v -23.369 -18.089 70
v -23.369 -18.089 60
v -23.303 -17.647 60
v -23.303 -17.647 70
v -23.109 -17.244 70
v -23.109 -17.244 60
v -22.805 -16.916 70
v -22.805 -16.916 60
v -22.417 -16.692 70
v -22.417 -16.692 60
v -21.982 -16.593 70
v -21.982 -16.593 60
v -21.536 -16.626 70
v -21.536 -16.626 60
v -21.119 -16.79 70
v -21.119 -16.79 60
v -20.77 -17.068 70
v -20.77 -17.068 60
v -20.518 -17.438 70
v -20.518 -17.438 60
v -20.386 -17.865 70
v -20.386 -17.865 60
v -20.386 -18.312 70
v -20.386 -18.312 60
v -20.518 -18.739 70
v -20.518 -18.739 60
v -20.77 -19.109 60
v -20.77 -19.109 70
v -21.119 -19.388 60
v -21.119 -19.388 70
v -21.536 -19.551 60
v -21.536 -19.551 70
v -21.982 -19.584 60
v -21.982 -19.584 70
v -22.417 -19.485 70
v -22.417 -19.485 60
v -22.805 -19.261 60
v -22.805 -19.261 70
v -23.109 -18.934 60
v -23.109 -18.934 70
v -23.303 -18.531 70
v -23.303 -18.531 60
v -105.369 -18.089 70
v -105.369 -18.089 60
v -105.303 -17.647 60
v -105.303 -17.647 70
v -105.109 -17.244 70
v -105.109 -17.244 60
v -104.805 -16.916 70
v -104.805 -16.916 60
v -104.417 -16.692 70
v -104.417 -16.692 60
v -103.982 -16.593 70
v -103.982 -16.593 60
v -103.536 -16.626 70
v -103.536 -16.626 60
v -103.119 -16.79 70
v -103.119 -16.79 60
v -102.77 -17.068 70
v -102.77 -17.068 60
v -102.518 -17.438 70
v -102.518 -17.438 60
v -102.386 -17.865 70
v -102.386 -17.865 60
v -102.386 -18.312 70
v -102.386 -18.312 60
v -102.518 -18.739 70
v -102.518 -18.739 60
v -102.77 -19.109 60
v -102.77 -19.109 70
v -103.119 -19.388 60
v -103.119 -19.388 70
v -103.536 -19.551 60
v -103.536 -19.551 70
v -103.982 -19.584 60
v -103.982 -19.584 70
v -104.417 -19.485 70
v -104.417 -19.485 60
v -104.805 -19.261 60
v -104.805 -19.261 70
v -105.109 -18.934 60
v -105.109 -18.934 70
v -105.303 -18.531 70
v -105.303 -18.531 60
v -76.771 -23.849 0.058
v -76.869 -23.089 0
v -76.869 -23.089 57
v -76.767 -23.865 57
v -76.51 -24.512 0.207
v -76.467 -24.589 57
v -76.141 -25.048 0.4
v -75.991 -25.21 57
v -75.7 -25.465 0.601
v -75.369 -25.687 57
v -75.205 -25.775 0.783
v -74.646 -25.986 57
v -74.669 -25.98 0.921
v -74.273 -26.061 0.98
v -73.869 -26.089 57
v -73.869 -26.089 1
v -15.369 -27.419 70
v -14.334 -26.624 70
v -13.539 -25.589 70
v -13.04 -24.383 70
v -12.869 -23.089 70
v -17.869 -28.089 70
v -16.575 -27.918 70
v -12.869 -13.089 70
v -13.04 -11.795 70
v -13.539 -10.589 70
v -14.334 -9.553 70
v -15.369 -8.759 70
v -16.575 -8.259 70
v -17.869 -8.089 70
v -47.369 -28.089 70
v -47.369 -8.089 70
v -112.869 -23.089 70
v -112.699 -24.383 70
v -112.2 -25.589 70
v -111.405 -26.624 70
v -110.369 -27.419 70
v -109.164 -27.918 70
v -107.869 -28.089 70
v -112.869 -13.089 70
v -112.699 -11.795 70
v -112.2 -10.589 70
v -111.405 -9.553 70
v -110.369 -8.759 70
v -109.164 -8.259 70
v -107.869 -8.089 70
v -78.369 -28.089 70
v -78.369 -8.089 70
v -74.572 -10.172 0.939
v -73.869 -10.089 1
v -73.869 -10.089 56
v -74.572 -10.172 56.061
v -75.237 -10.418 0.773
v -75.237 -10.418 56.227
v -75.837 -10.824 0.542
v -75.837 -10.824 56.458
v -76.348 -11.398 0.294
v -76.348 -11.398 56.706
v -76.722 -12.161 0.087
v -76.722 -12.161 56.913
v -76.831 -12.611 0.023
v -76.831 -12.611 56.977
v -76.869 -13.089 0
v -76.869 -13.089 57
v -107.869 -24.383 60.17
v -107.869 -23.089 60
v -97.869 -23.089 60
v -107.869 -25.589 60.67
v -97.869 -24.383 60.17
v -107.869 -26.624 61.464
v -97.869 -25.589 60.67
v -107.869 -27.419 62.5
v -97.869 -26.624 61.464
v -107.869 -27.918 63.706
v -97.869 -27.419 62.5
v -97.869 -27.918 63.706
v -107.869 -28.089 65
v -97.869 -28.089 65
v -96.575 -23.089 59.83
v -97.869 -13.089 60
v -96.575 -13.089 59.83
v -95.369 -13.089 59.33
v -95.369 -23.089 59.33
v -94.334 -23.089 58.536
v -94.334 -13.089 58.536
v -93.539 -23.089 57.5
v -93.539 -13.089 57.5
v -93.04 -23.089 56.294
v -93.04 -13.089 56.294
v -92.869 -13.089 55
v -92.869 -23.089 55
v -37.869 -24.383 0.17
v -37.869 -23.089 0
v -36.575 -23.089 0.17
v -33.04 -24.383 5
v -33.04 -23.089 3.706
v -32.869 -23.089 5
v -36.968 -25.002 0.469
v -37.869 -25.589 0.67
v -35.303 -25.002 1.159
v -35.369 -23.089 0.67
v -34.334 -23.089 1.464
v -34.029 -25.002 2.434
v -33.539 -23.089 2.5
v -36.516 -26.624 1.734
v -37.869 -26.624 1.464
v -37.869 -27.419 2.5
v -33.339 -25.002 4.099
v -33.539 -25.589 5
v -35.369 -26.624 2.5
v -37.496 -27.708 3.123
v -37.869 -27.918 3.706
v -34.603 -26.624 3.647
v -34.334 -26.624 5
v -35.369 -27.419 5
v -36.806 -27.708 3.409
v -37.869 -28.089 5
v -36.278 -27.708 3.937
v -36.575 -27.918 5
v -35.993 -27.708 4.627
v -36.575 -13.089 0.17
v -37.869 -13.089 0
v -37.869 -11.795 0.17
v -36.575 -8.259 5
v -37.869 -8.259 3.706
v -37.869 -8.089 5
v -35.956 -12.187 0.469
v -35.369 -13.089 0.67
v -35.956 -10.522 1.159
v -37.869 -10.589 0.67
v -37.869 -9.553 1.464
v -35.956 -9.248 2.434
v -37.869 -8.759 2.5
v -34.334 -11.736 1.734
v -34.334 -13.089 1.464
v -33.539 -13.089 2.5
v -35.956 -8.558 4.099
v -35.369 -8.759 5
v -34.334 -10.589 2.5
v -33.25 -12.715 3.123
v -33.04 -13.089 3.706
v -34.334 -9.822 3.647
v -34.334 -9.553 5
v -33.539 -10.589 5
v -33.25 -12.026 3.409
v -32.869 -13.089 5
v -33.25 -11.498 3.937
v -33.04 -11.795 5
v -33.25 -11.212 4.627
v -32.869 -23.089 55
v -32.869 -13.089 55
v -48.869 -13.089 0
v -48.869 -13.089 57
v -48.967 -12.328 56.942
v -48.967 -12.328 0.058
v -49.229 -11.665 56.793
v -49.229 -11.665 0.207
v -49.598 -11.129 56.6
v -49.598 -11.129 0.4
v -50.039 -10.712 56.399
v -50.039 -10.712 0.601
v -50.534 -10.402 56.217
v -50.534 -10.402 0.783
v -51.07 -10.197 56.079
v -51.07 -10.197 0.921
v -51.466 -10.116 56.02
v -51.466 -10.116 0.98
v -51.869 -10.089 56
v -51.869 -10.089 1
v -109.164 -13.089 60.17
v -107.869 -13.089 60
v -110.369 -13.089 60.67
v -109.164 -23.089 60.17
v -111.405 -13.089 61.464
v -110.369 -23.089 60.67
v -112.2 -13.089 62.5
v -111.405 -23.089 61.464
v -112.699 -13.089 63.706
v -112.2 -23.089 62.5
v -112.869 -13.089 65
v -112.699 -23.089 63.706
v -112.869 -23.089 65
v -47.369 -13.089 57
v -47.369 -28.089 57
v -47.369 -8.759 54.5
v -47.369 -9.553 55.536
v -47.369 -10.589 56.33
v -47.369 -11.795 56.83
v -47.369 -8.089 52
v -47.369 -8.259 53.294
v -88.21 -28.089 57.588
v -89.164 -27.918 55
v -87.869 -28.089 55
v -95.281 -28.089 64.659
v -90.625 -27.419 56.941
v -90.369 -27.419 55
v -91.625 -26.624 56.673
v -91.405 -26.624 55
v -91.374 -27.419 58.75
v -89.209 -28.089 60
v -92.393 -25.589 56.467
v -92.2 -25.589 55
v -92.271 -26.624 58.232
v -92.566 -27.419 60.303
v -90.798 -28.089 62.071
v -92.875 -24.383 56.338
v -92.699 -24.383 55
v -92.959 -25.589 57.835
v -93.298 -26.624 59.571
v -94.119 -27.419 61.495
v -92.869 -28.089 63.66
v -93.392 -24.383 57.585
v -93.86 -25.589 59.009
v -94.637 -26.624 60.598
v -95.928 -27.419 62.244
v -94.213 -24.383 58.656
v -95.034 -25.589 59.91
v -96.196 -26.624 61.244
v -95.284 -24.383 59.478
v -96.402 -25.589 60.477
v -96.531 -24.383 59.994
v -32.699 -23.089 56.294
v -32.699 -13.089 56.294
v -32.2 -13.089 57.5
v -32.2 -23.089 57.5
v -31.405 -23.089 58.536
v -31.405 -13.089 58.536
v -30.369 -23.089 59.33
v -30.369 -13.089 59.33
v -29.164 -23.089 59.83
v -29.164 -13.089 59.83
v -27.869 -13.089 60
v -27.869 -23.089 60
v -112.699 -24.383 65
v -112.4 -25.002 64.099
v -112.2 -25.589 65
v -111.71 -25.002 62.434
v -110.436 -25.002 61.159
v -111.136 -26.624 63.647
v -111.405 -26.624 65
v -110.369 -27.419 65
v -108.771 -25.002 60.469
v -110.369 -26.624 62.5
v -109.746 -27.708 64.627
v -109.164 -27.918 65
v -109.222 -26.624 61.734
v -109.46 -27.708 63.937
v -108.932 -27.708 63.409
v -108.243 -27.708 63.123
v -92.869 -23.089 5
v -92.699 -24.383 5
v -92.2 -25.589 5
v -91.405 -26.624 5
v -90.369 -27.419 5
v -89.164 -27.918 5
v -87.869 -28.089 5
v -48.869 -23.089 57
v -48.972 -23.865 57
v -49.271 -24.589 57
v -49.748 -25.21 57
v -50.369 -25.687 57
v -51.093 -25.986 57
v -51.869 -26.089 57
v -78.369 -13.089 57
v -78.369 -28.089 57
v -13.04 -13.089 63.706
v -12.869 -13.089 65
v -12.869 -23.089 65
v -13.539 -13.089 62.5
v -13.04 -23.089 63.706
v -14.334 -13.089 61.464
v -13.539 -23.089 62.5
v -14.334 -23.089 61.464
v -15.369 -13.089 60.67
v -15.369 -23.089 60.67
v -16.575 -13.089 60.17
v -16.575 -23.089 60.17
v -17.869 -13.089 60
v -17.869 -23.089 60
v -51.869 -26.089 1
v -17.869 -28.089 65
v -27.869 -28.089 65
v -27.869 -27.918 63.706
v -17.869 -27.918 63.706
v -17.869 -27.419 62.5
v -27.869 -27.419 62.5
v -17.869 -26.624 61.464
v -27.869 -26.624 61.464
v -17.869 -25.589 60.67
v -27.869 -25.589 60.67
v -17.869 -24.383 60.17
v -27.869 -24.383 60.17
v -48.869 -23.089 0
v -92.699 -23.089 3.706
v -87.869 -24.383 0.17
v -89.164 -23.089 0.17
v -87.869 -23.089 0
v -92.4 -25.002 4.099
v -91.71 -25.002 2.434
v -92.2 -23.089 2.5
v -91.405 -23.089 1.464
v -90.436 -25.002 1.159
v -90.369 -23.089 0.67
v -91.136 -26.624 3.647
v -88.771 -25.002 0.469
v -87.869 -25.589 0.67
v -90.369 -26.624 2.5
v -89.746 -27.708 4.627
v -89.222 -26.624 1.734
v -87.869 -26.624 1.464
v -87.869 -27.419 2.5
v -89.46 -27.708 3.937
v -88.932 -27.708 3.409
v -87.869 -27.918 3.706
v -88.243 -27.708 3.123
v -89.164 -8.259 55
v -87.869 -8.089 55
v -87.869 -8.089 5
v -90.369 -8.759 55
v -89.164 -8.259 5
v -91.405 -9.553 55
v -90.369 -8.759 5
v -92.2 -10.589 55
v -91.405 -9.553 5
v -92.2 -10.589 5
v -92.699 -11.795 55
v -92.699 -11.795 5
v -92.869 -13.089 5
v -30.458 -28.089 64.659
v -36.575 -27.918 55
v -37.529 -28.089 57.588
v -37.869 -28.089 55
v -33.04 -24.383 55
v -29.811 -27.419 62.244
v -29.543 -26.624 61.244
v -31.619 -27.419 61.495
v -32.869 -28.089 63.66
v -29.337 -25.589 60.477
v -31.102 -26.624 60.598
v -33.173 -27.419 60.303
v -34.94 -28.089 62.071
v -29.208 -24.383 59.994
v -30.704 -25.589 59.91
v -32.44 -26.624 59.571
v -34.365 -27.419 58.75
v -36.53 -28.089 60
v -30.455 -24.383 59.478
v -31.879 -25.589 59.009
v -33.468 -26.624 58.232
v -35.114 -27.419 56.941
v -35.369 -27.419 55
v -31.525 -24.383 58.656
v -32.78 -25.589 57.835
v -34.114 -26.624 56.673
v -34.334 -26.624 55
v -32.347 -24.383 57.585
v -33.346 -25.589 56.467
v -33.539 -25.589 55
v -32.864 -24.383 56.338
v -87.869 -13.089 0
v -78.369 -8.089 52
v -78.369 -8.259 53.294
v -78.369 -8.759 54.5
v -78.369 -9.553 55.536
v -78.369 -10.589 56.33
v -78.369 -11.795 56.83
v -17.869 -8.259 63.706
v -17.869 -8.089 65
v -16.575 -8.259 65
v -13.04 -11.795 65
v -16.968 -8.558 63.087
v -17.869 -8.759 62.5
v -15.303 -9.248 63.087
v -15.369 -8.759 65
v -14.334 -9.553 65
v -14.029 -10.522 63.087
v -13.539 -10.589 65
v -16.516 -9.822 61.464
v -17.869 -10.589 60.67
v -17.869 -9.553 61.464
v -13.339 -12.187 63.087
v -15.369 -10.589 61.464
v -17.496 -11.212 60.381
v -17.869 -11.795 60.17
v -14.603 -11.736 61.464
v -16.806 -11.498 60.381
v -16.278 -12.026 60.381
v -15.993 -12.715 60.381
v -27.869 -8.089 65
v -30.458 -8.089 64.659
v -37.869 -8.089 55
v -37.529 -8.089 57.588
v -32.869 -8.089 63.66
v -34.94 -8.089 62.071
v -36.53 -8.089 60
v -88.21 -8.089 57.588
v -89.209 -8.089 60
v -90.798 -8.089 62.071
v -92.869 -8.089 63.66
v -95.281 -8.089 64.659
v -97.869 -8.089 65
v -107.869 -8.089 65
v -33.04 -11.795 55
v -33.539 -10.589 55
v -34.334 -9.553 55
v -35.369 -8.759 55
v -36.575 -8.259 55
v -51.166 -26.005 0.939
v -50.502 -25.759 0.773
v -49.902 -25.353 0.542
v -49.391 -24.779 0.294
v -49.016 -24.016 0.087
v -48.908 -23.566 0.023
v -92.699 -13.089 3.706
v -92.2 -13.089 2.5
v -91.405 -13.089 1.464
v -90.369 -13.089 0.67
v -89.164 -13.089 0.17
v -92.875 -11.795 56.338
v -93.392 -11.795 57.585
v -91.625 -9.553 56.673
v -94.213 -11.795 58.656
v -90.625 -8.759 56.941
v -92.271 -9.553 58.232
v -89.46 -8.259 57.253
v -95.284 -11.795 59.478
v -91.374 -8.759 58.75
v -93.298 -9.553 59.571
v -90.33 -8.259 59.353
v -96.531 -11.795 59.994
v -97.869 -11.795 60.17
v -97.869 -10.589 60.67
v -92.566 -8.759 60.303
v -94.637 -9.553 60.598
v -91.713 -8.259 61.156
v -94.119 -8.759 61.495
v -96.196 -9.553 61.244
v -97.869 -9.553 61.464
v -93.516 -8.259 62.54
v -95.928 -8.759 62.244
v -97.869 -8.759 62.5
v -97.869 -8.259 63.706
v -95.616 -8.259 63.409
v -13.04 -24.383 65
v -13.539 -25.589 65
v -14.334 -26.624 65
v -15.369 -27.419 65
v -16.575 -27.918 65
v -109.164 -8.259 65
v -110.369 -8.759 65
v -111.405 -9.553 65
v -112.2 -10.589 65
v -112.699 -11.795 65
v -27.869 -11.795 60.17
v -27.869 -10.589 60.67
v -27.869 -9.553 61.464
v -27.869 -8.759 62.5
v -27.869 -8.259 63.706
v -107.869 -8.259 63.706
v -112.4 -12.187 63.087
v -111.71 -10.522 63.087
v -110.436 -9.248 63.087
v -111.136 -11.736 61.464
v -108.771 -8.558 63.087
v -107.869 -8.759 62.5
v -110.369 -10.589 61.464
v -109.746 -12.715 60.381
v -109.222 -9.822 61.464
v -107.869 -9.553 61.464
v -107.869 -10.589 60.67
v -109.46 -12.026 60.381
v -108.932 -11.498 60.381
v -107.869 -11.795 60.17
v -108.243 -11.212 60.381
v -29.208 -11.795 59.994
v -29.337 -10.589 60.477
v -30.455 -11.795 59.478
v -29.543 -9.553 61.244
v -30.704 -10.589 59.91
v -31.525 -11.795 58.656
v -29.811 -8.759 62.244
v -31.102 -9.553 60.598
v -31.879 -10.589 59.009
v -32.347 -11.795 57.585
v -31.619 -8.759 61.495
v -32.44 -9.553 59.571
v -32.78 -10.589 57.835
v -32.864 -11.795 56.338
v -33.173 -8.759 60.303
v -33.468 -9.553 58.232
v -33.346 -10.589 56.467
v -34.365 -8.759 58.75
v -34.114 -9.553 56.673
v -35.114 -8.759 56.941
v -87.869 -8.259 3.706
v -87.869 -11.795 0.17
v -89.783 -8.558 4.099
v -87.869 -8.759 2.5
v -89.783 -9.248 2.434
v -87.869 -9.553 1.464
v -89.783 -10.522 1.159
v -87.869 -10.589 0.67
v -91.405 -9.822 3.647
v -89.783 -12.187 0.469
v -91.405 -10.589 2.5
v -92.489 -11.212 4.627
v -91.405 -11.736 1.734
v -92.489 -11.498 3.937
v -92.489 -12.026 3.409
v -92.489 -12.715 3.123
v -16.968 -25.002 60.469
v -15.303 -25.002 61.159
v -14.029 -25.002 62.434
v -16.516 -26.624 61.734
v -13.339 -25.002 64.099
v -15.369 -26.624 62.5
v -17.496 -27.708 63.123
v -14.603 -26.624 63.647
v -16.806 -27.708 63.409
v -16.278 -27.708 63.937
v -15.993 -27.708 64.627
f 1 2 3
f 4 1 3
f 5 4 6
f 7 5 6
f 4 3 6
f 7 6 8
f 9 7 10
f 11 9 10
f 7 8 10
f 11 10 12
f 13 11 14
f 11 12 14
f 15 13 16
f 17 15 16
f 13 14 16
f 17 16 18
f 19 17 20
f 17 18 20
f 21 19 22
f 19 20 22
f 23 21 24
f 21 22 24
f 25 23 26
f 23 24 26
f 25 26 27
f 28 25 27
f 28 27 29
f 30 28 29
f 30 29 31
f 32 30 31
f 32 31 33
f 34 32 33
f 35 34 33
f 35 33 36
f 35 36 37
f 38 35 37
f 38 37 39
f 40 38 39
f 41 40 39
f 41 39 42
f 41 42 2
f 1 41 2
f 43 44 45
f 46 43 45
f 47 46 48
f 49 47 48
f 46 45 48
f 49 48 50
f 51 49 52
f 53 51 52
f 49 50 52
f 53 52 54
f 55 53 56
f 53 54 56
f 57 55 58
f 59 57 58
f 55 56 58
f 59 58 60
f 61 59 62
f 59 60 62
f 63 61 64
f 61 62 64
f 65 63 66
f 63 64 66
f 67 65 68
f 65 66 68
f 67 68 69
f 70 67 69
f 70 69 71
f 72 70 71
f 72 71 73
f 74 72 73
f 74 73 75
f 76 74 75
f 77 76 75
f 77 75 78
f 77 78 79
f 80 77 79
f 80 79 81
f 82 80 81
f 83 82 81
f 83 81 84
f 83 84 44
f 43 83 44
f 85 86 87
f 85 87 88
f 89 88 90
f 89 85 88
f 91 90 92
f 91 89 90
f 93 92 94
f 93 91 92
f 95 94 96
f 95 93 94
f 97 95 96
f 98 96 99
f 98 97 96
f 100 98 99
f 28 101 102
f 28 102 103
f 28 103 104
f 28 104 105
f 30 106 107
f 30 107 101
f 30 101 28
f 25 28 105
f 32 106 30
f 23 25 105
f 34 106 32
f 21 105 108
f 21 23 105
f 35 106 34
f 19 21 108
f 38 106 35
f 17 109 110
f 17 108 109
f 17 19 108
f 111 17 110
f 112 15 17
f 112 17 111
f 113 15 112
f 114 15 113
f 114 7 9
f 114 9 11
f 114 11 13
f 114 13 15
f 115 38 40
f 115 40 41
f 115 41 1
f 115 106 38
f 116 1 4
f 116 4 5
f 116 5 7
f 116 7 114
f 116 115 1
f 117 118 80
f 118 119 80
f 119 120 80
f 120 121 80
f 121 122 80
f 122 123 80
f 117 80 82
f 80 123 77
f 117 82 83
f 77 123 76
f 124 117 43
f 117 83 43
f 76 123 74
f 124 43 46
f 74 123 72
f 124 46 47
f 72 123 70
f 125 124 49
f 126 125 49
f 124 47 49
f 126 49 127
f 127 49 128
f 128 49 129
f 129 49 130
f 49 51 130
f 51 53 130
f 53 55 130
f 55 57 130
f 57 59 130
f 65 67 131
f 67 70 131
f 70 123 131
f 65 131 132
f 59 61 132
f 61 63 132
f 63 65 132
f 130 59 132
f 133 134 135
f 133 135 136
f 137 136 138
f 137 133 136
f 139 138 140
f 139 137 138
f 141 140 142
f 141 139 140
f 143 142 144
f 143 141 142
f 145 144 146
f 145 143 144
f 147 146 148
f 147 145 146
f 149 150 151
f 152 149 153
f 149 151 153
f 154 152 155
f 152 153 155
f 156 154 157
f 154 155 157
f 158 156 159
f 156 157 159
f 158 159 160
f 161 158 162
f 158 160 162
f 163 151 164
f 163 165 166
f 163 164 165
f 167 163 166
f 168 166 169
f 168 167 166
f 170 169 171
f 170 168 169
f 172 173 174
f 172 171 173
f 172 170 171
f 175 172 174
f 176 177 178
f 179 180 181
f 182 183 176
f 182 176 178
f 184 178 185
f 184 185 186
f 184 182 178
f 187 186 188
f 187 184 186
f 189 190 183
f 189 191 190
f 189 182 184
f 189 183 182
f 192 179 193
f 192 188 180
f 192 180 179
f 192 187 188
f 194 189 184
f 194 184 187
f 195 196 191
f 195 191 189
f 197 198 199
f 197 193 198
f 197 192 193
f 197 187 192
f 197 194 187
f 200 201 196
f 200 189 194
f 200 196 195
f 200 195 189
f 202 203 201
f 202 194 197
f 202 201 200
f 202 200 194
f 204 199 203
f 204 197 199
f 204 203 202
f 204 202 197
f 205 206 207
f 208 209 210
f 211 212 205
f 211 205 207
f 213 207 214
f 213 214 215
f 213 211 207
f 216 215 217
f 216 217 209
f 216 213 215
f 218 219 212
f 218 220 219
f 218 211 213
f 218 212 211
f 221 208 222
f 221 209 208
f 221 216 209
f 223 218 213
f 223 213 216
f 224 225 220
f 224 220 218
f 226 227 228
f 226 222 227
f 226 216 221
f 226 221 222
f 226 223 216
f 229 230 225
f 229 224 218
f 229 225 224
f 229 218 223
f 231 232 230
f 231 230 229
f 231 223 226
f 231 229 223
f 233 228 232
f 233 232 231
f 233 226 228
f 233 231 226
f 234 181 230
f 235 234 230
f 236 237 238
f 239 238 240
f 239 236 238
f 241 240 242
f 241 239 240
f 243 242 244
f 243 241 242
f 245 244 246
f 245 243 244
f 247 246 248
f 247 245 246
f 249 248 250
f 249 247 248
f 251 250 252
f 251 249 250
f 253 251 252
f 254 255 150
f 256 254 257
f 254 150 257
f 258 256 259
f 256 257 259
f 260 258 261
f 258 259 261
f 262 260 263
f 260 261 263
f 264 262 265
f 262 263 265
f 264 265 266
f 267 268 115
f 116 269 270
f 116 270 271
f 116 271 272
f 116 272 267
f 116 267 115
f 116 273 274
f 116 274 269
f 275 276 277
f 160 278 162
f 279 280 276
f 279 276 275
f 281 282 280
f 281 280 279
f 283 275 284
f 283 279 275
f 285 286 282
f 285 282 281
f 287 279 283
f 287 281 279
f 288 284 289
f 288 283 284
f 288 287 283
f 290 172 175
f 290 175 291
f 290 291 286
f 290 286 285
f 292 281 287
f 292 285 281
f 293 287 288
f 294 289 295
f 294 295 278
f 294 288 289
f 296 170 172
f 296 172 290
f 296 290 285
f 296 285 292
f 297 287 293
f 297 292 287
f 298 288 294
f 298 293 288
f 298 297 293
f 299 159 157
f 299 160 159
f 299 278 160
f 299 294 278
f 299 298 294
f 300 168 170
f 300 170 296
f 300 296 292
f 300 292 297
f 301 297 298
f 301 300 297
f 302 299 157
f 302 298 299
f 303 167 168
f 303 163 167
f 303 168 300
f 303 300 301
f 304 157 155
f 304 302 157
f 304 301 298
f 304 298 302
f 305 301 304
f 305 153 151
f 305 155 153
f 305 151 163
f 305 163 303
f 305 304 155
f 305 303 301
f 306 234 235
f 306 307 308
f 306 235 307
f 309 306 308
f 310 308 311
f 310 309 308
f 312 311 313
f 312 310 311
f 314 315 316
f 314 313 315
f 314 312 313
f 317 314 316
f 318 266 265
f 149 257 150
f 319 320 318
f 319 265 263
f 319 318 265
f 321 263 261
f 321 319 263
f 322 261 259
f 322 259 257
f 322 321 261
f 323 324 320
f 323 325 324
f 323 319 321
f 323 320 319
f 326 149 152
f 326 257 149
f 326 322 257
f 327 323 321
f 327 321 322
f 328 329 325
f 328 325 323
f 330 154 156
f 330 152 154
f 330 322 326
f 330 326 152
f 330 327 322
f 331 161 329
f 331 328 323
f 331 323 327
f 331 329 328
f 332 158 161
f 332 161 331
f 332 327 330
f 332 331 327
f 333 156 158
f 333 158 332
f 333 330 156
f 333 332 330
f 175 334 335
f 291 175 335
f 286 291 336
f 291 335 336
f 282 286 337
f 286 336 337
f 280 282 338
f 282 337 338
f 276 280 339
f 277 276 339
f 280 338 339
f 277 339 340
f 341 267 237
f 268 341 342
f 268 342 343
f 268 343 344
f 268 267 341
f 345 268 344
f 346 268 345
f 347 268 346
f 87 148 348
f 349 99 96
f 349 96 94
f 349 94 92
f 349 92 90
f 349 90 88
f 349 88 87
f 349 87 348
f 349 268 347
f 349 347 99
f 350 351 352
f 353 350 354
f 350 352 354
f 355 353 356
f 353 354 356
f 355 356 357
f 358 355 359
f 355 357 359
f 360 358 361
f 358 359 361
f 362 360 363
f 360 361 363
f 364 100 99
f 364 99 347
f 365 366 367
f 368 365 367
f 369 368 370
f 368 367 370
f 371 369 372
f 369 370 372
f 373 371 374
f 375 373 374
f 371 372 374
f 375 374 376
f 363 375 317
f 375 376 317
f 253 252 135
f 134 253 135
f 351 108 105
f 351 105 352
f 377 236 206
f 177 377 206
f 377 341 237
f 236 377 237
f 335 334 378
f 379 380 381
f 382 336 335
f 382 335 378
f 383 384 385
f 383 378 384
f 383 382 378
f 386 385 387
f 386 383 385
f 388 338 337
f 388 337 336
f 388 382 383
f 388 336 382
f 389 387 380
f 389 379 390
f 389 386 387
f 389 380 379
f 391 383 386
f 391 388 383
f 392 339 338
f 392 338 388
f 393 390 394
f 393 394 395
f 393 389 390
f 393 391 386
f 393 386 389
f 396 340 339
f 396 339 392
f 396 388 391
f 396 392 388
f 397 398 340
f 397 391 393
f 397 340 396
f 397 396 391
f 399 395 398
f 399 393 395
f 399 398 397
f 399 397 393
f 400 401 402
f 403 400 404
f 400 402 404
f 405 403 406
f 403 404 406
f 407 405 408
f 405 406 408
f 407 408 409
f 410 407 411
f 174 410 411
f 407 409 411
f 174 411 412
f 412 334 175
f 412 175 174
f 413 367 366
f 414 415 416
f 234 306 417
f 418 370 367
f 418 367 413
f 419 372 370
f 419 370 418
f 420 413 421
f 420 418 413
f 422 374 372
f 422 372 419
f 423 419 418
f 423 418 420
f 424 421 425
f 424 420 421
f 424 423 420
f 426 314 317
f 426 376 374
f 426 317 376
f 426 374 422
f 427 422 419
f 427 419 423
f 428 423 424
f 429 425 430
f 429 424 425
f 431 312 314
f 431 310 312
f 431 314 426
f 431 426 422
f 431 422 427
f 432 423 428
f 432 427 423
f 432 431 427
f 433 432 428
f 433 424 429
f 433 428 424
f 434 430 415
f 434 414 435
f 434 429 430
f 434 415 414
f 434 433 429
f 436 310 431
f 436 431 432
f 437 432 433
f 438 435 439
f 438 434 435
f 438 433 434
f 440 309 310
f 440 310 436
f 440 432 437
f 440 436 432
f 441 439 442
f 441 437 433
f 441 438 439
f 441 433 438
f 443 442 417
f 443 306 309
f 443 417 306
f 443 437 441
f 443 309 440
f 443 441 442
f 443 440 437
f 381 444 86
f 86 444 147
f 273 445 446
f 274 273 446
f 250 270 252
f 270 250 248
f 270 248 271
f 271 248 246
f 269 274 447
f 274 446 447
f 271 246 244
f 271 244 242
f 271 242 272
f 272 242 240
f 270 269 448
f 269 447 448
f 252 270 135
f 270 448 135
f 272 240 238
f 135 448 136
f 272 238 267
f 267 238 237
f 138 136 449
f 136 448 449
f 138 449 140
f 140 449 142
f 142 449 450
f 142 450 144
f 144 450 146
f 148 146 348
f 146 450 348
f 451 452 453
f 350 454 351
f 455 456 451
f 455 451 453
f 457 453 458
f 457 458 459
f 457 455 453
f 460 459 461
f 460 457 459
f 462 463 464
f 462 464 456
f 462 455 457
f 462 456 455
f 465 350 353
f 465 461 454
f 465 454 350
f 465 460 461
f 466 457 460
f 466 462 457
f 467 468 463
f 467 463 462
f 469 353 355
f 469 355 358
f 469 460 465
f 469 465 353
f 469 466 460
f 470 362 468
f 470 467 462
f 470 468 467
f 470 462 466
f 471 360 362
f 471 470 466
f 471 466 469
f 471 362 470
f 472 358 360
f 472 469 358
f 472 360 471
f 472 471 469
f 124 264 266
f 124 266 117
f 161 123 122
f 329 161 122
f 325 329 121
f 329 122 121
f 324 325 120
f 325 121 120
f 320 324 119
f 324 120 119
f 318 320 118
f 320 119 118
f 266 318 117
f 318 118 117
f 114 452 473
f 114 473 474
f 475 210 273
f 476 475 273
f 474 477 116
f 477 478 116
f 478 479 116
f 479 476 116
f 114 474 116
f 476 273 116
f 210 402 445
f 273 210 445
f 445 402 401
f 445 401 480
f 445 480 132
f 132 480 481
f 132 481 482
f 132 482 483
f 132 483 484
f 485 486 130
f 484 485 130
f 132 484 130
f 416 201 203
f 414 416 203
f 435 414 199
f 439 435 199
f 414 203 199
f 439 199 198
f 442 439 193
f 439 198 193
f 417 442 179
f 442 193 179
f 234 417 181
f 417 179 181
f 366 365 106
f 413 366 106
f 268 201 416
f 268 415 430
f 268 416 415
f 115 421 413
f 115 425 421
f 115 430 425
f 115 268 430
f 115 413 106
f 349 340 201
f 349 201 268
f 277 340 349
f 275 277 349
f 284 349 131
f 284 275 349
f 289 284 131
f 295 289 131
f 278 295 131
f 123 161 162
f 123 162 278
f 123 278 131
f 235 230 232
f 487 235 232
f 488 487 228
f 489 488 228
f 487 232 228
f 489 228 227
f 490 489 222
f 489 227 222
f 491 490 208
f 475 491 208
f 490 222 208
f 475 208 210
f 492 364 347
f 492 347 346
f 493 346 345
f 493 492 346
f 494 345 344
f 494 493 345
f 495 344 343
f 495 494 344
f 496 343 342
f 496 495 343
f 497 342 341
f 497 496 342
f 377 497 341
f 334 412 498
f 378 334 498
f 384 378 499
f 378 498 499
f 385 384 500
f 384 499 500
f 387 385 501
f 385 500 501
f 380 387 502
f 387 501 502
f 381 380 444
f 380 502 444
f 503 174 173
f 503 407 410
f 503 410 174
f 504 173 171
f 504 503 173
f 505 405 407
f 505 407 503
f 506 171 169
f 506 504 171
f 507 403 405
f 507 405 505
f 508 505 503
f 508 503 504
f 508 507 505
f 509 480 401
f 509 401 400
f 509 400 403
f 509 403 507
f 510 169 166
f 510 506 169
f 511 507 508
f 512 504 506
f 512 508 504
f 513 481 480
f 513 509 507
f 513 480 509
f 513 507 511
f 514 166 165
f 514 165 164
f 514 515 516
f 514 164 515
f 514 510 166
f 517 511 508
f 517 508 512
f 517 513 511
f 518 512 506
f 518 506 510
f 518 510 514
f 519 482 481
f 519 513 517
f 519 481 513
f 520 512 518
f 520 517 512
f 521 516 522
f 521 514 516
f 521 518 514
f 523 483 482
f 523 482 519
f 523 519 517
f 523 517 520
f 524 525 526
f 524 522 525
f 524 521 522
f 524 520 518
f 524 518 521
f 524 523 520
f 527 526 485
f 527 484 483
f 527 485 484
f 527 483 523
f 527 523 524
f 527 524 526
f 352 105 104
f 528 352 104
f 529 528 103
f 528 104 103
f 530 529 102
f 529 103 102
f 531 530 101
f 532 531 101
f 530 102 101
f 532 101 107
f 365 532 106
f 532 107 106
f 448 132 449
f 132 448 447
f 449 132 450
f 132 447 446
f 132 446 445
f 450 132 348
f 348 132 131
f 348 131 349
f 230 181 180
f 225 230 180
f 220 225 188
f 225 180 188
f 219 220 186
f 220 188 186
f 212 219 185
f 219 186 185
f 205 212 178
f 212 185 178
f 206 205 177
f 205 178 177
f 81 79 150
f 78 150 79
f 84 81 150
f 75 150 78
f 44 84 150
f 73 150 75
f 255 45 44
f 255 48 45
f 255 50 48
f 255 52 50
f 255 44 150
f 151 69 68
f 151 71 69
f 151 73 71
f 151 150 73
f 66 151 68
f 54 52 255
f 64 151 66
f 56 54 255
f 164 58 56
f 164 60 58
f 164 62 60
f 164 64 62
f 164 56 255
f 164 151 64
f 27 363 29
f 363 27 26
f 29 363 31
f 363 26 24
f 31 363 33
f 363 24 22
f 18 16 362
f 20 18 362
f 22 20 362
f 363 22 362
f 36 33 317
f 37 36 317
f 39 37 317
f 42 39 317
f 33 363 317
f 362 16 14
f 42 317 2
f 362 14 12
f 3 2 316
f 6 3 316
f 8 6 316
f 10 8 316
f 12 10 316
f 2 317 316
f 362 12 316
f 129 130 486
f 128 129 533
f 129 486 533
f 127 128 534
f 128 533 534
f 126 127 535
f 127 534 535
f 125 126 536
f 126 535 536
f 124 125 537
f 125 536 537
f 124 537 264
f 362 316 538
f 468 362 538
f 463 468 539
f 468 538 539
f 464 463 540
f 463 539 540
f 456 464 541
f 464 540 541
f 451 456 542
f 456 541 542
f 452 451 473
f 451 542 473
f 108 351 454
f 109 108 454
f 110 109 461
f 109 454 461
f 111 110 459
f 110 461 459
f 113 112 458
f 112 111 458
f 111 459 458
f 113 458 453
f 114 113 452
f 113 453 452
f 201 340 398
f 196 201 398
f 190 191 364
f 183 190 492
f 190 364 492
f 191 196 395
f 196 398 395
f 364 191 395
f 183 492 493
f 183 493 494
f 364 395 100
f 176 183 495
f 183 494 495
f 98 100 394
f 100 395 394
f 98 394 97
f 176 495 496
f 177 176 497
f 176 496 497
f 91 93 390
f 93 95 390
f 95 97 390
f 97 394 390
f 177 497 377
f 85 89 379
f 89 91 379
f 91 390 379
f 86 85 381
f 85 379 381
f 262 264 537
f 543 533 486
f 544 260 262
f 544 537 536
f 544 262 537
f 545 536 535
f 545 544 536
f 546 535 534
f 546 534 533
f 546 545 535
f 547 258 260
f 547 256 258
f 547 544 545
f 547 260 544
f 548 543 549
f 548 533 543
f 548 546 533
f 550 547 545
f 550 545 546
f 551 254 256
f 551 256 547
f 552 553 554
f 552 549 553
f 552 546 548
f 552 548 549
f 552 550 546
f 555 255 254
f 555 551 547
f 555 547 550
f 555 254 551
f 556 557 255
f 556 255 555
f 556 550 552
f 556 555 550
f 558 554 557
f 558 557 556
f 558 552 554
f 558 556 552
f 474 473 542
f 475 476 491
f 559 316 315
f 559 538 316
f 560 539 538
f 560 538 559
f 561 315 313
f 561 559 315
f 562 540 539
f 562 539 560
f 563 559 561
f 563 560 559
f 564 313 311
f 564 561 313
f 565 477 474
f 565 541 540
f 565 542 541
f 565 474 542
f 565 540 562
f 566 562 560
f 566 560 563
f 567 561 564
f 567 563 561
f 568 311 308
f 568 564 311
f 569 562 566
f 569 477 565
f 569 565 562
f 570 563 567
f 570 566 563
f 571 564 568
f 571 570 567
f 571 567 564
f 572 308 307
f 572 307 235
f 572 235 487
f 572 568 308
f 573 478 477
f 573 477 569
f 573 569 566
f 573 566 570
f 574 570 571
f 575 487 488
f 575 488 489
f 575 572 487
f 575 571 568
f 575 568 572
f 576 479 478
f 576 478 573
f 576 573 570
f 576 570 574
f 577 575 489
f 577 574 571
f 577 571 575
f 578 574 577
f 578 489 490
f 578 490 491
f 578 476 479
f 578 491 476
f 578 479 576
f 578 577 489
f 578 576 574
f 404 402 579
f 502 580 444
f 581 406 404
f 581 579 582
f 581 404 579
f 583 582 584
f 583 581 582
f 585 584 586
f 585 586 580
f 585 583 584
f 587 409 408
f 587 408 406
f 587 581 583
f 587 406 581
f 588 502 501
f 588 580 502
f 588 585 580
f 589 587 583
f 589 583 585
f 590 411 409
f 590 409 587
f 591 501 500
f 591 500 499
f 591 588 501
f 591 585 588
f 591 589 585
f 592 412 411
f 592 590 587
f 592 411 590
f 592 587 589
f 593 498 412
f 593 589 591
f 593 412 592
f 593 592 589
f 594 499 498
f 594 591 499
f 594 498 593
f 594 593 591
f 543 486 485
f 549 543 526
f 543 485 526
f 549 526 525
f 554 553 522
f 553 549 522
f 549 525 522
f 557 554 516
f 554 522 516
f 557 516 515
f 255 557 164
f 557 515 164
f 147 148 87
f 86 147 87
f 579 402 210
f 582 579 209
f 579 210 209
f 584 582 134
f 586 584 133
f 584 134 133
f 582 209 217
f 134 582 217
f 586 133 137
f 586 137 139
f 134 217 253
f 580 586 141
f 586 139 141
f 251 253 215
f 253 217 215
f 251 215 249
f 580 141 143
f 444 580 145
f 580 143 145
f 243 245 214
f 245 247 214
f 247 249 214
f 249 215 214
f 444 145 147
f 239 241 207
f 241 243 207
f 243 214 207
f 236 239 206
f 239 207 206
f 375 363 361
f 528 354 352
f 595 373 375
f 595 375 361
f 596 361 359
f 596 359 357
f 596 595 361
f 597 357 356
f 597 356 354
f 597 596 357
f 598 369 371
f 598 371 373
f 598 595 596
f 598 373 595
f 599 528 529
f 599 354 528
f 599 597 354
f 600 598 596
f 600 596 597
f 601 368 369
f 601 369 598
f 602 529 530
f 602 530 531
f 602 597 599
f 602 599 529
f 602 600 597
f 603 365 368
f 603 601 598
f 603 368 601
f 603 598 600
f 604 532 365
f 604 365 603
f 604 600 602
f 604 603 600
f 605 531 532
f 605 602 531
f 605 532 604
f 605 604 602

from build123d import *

# Parameters (mm, degrees)
ESBO_O1_W                = 60
ESBO_O1_H                = 20
RESSALTO_EXTRUS_O1_DEPTH = 70
ESBO_O4_W                = 31
ESBO_O4_H                = 13
CORTE_EXTRUS_O2_DEPTH    = 119.003086654
ESBO_O6_W                = 10
ESBO_O6_H                = 20
RESSALTO_EXTRUS_O2_DEPTH = 20
ESBO_O5_W                = 10
ESBO_O5_H                = 20
RESSALTO_EXTRUS_O3_DEPTH = 20
CORTE_EXTRUS_O4_REACH    = 137.752
FILETE1_R                = 5
ESBO_O8_R                = 1.5
CORTE_EXTRUS_O5_DEPTH    = 131.875812627
FILETE2_R                = 5


with BuildPart() as part:
    # Esboço1 → Ressalto-extrusão1 (new body)
    with BuildSketch(Plane.XY):
        with Locations((-62.86941617, -18.088666872)):
            Rectangle(ESBO_O1_W, ESBO_O1_H)
    extrude(amount=RESSALTO_EXTRUS_O1_DEPTH)

    # Esboço4 → Corte-extrusão2 (cut, through all)
    with BuildSketch(Plane(origin=(0, -28.088666872, 0), x_dir=(-1, 0, 0), z_dir=(0, -1, 0))):
        with Locations((62.86941617, -63.5)):
            Rectangle(ESBO_O4_W, ESBO_O4_H)
    extrude(amount=-CORTE_EXTRUS_O2_DEPTH, mode=Mode.SUBTRACT)

    # Esboço6 → Ressalto-extrusão2 (add)
    with BuildSketch(Plane.ZY.offset(92.86941617)):
        with Locations((65, -18.088666872)):
            Rectangle(ESBO_O6_W, ESBO_O6_H)
    extrude(amount=RESSALTO_EXTRUS_O2_DEPTH)

    # Esboço5 → Ressalto-extrusão3 (add)
    with BuildSketch(Plane(origin=(-32.86941617, 0, 0), x_dir=(0, 0, -1), z_dir=(1, 0, 0))):
        with Locations((-65, -18.088666872)):
            Rectangle(ESBO_O5_W, ESBO_O5_H)
    extrude(amount=RESSALTO_EXTRUS_O3_DEPTH)

    # Esboço7 → Corte-extrusão4 (cut, up to next)
    with BuildSketch(Plane(origin=(0, 0, 0), x_dir=(-1, 0, 0), z_dir=(0, 0, -1)), mode=Mode.PRIVATE) as corte_extrus_o4_sk1:
        with BuildLine():
            Line((73.86941617, -26.088666872), (51.86941617, -26.088666872))
            ThreePointArc((51.86941617, -26.088666872), (49.748095827, -25.209987216), (48.86941617, -23.088666872))
            Line((48.86941617, -23.088666872), (48.86941617, -13.088666872))
            ThreePointArc((48.86941617, -13.088666872), (49.748095827, -10.967346529), (51.86941617, -10.088666872))
            Line((51.86941617, -10.088666872), (73.86941617, -10.088666872))
            ThreePointArc((73.86941617, -10.088666872), (75.990736514, -10.967346529), (76.86941617, -13.088666872))
            Line((76.86941617, -13.088666872), (76.86941617, -23.088666872))
            ThreePointArc((76.86941617, -23.088666872), (75.990736514, -25.209987216), (73.86941617, -26.088666872))
        make_face()
    corte_extrus_o4_tool1 = extrude(corte_extrus_o4_sk1.sketch, amount=-CORTE_EXTRUS_O4_REACH, mode=Mode.PRIVATE) & part.part
    add(corte_extrus_o4_tool1.solids().sort_by_distance((-62.869416, -18.088667, 0))[0], mode=Mode.SUBTRACT)

    # Filete1
    # the kernel refuses this fillet: 5 mm, written as the material it adds along each edge
    with BuildSketch(Plane(origin=(-92.86941617, -28.088666872, 60), x_dir=(0, 0, -1), z_dir=(0, 1, 0)), Plane(origin=(-32.86941617, -28.088666872, 60), x_dir=(1, 0, 0), z_dir=(0, 1, 0))) as filete1_piece_1:
        with BuildLine():
            CenterArc((FILETE1_R, FILETE1_R), FILETE1_R, 180, 90)
            Line((0, FILETE1_R), (0, 0))
            Line((0, 0), (FILETE1_R, 0))
        make_face()
    extrude(amount=20)
    # the kernel refuses this fillet: 5 mm, written as the material it takes off along each edge
    with BuildSketch(Plane(origin=(-12.86941617, -8.088666872, 47.5), x_dir=(0, -1, 0), z_dir=(0, 0, 1)), Plane(origin=(-112.86941617, -28.088666872, 82.5), x_dir=(1, 0, 0), z_dir=(0, 0, -1))) as filete1_2_piece_1:
        with BuildLine():
            CenterArc((FILETE1_R, -FILETE1_R), FILETE1_R, 90, 90)
            Line((0, -FILETE1_R), (0, 0))
            Line((0, 0), (FILETE1_R, 0))
        make_face()
    extrude(amount=35, mode=Mode.SUBTRACT)
    with BuildSketch(Plane(origin=(-112.86941617, -8.088666872, 47.5), x_dir=(0, -1, 0), z_dir=(0, 0, 1)), Plane(origin=(-12.86941617, -28.088666872, 82.5), x_dir=(-1, 0, 0), z_dir=(0, 0, -1))) as filete1_2_piece_2:
        with BuildLine():
            CenterArc((FILETE1_R, FILETE1_R), FILETE1_R, 180, 90)
            Line((0, FILETE1_R), (0, 0))
            Line((0, 0), (FILETE1_R, 0))
        make_face()
    extrude(amount=35, mode=Mode.SUBTRACT)
    with BuildSketch(Plane(origin=(-112.86941617, -40.588666872, 60), x_dir=(1, 0, 0), z_dir=(0, 1, 0)), Plane(origin=(-12.86941617, -40.588666872, 60), x_dir=(0, 0, 1), z_dir=(0, 1, 0))) as filete1_2_piece_3:
        with BuildLine():
            CenterArc((FILETE1_R, -FILETE1_R), FILETE1_R, 90, 90)
            Line((0, -FILETE1_R), (0, 0))
            Line((0, 0), (FILETE1_R, 0))
        make_face()
    extrude(amount=45, mode=Mode.SUBTRACT)
    with BuildSketch(Plane(origin=(-105.36941617, -28.088666872, 0), x_dir=(0, 0, 1), z_dir=(1, 0, 0))) as filete1_2_piece_4:
        with BuildLine():
            CenterArc((FILETE1_R, -FILETE1_R), FILETE1_R, 90, 90)
            Line((0, -FILETE1_R), (0, 0))
            Line((0, 0), (FILETE1_R, 0))
        make_face()
    extrude(amount=85, mode=Mode.SUBTRACT)
    with BuildSketch(Plane(origin=(-92.86941617, 4.411333128, 0), x_dir=(1, 0, 0), z_dir=(0, -1, 0)), Plane(origin=(-32.86941617, -40.588666872, 0), x_dir=(-1, 0, 0), z_dir=(0, 1, 0))) as filete1_2_piece_5:
        with BuildLine():
            CenterArc((FILETE1_R, FILETE1_R), FILETE1_R, 180, 90)
            Line((0, FILETE1_R), (0, 0))
            Line((0, 0), (FILETE1_R, 0))
        make_face()
    extrude(amount=45, mode=Mode.SUBTRACT)
    with BuildSketch(Plane(origin=(-20.36941617, -8.088666872, 0), x_dir=(0, -1, 0), z_dir=(-1, 0, 0))) as filete1_2_piece_6:
        with BuildLine():
            CenterArc((FILETE1_R, FILETE1_R), FILETE1_R, 180, 90)
            Line((0, FILETE1_R), (0, 0))
            Line((0, 0), (FILETE1_R, 0))
        make_face()
    extrude(amount=85, mode=Mode.SUBTRACT)
    # the kernel refuses this fillet: 5 mm, written as the material it takes off along each edge
    with BuildSketch(Plane(origin=(-87.86941617, -23.088666872, 5), x_dir=(-1, 0, 0), z_dir=(0, -1, 0))) as filete1_3_piece_1_section:
        Polygon((0, 0), (FILETE1_R, 0), (FILETE1_R, FILETE1_R), (0, FILETE1_R), align=None)
    filete1_3_piece_1 = extrude(amount=FILETE1_R, mode=Mode.PRIVATE)
    filete1_3_piece_1 = filete1_3_piece_1 - Plane(origin=(-87.86941617, -23.088666872, 5), x_dir=(0.7071067811865475, 0, 0.7071067811865475), z_dir=(0, -1, 0)) * Sphere(FILETE1_R, mode=Mode.PRIVATE)
    add(filete1_3_piece_1, mode=Mode.SUBTRACT)
    with BuildSketch(Plane(origin=(-87.86941617, -13.088666872, 5), x_dir=(0, 1, 0), z_dir=(-1, 0, 0))) as filete1_3_piece_2_section:
        Polygon((0, 0), (FILETE1_R, 0), (FILETE1_R, FILETE1_R), (0, FILETE1_R), align=None)
    filete1_3_piece_2 = extrude(amount=FILETE1_R, mode=Mode.PRIVATE)
    filete1_3_piece_2 = filete1_3_piece_2 - Plane(origin=(-87.86941617, -13.088666872, 5), x_dir=(0, -0.7071067811865475, 0.7071067811865475), z_dir=(-1, 0, 0)) * Sphere(FILETE1_R, mode=Mode.PRIVATE)
    add(filete1_3_piece_2, mode=Mode.SUBTRACT)
    with BuildSketch(Plane(origin=(-37.86941617, -13.088666872, 5), x_dir=(0, 1, 0), z_dir=(1, 0, 0))) as filete1_3_piece_3_section:
        Polygon((0, 0), (FILETE1_R, 0), (FILETE1_R, -FILETE1_R), (0, -FILETE1_R), align=None)
    filete1_3_piece_3 = extrude(amount=FILETE1_R, mode=Mode.PRIVATE)
    filete1_3_piece_3 = filete1_3_piece_3 - Plane(origin=(-37.86941617, -13.088666872, 5), x_dir=(0, -0.7071067811865475, 0.7071067811865475), z_dir=(1, 0, 0)) * Sphere(FILETE1_R, mode=Mode.PRIVATE)
    add(filete1_3_piece_3, mode=Mode.SUBTRACT)
    with BuildSketch(Plane(origin=(-37.86941617, -23.088666872, 5), x_dir=(1, 0, 0), z_dir=(0, -1, 0))) as filete1_3_piece_4_section:
        Polygon((0, 0), (FILETE1_R, 0), (FILETE1_R, -FILETE1_R), (0, -FILETE1_R), align=None)
    filete1_3_piece_4 = extrude(amount=FILETE1_R, mode=Mode.PRIVATE)
    filete1_3_piece_4 = filete1_3_piece_4 - Plane(origin=(-37.86941617, -23.088666872, 5), x_dir=(-0.7071067811865475, 0, 0.7071067811865475), z_dir=(0, -1, 0)) * Sphere(FILETE1_R, mode=Mode.PRIVATE)
    add(filete1_3_piece_4, mode=Mode.SUBTRACT)
    with BuildSketch(Plane(origin=(-107.86941617, -23.088666872, 65), x_dir=(0, 0, -1), z_dir=(0, -1, 0))) as filete1_3_piece_5_section:
        Polygon((0, 0), (FILETE1_R, 0), (FILETE1_R, -FILETE1_R), (0, -FILETE1_R), align=None)
    filete1_3_piece_5 = extrude(amount=FILETE1_R, mode=Mode.PRIVATE)
    filete1_3_piece_5 = filete1_3_piece_5 - Plane(origin=(-107.86941617, -23.088666872, 65), x_dir=(0.7071067811865475, 0, 0.7071067811865475), z_dir=(0, -1, 0)) * Sphere(FILETE1_R, mode=Mode.PRIVATE)
    add(filete1_3_piece_5, mode=Mode.SUBTRACT)
    with BuildSketch(Plane(origin=(-17.86941617, -13.088666872, 65), x_dir=(0, 1, 0), z_dir=(0, 0, -1))) as filete1_3_piece_6_section:
        Polygon((0, 0), (FILETE1_R, 0), (FILETE1_R, FILETE1_R), (0, FILETE1_R), align=None)
    filete1_3_piece_6 = extrude(amount=FILETE1_R, mode=Mode.PRIVATE)
    filete1_3_piece_6 = filete1_3_piece_6 - Plane(origin=(-17.86941617, -13.088666872, 65), x_dir=(-0.7071067811865475, -0.7071067811865475, 0), z_dir=(0, 0, -1)) * Sphere(FILETE1_R, mode=Mode.PRIVATE)
    add(filete1_3_piece_6, mode=Mode.SUBTRACT)
    with BuildSketch(Plane(origin=(-17.86941617, -23.088666872, 65), x_dir=(0, 0, -1), z_dir=(0, -1, 0))) as filete1_3_piece_7_section:
        Polygon((0, 0), (FILETE1_R, 0), (FILETE1_R, FILETE1_R), (0, FILETE1_R), align=None)
    filete1_3_piece_7 = extrude(amount=FILETE1_R, mode=Mode.PRIVATE)
    filete1_3_piece_7 = filete1_3_piece_7 - Plane(origin=(-17.86941617, -23.088666872, 65), x_dir=(-0.7071067811865475, 0, 0.7071067811865475), z_dir=(0, -1, 0)) * Sphere(FILETE1_R, mode=Mode.PRIVATE)
    add(filete1_3_piece_7, mode=Mode.SUBTRACT)
    with BuildSketch(Plane(origin=(-107.86941617, -13.088666872, 65), x_dir=(0, 1, 0), z_dir=(0, 0, -1))) as filete1_3_piece_8_section:
        Polygon((0, 0), (FILETE1_R, 0), (FILETE1_R, -FILETE1_R), (0, -FILETE1_R), align=None)
    filete1_3_piece_8 = extrude(amount=FILETE1_R, mode=Mode.PRIVATE)
    filete1_3_piece_8 = filete1_3_piece_8 - Plane(origin=(-107.86941617, -13.088666872, 65), x_dir=(0.7071067811865475, -0.7071067811865475, 0), z_dir=(0, 0, -1)) * Sphere(FILETE1_R, mode=Mode.PRIVATE)
    add(filete1_3_piece_8, mode=Mode.SUBTRACT)
    with BuildSketch(Plane(origin=(-97.86941617, -8.088666872, 60), x_dir=(0, -1, 0), z_dir=(-1, 0, 0)), Plane(origin=(-97.86941617, -28.088666872, 60), x_dir=(0, 0, 1), z_dir=(-1, 0, 0))) as filete1_3_piece_9:
        with BuildLine():
            CenterArc((FILETE1_R, FILETE1_R), FILETE1_R, 180, 90)
            Line((0, FILETE1_R), (0, 0))
            Line((0, 0), (FILETE1_R, 0))
        make_face()
    extrude(amount=10, mode=Mode.SUBTRACT)
    with BuildSketch(Plane(origin=(-27.86941617, -28.088666872, 60), x_dir=(0, 0, 1), z_dir=(1, 0, 0)), Plane(origin=(-27.86941617, -8.088666872, 60), x_dir=(0, -1, 0), z_dir=(1, 0, 0))) as filete1_3_piece_10:
        with BuildLine():
            CenterArc((FILETE1_R, -FILETE1_R), FILETE1_R, 90, 90)
            Line((0, -FILETE1_R), (0, 0))
            Line((0, 0), (FILETE1_R, 0))
        make_face()
    extrude(amount=10, mode=Mode.SUBTRACT)
    with BuildSketch(Plane(origin=(-32.86941617, -28.088666872, 5), x_dir=(-1, 0, 0), z_dir=(0, 0, 1)), Plane(origin=(-32.86941617, -8.088666872, 5), x_dir=(0, -1, 0), z_dir=(0, 0, 1))) as filete1_3_piece_11:
        with BuildLine():
            CenterArc((FILETE1_R, -FILETE1_R), FILETE1_R, 90, 90)
            Line((0, -FILETE1_R), (0, 0))
            Line((0, 0), (FILETE1_R, 0))
        make_face()
    extrude(amount=50, mode=Mode.SUBTRACT)
    with BuildSketch(Plane(origin=(-92.86941617, -8.088666872, 5), x_dir=(0, -1, 0), z_dir=(0, 0, 1)), Plane(origin=(-92.86941617, -28.088666872, 5), x_dir=(1, 0, 0), z_dir=(0, 0, 1))) as filete1_3_piece_12:
        with BuildLine():
            CenterArc((FILETE1_R, FILETE1_R), FILETE1_R, 180, 90)
            Line((0, FILETE1_R), (0, 0))
            Line((0, 0), (FILETE1_R, 0))
        make_face()
    extrude(amount=50, mode=Mode.SUBTRACT)
    with BuildSketch(Plane(origin=(-97.86941617, -28.088666872, 55), x_dir=(1, 0, 0), z_dir=(0, 0, -1))) as filete1_3_piece_13:
        with BuildLine():
            CenterArc((5 + FILETE1_R, -FILETE1_R), FILETE1_R, 90, 90)
            Line((5, -FILETE1_R), (5, 0))
            Line((5, 0), (5 + FILETE1_R, 0))
        make_face()
    revolve(axis=Axis((-97.86941617, -28.088666872, 55), (0, -1, 0)), revolution_arc=90, mode=Mode.SUBTRACT)
    with BuildSketch(Plane(origin=(-97.86941617, -8.088666872, 55), x_dir=(1, 0, 0), z_dir=(0, 0, -1))) as filete1_3_piece_14:
        with BuildLine():
            CenterArc((5 + FILETE1_R, FILETE1_R), FILETE1_R, 180, 90)
            Line((5 + FILETE1_R, 0), (5, 0))
            Line((5, 0), (5, FILETE1_R))
        make_face()
    revolve(axis=Axis((-97.86941617, -8.088666872, 55), (0, -1, 0)), revolution_arc=90, mode=Mode.SUBTRACT)
    with BuildSketch(Plane(origin=(-27.86941617, -8.088666872, 55), x_dir=(0, 0, 1), z_dir=(1, 0, 0))) as filete1_3_piece_15:
        with BuildLine():
            CenterArc((5 + FILETE1_R, FILETE1_R), FILETE1_R, 180, 90)
            Line((5 + FILETE1_R, 0), (5, 0))
            Line((5, 0), (5, FILETE1_R))
        make_face()
    revolve(axis=Axis((-27.86941617, -8.088666872, 55), (0, -1, 0)), revolution_arc=90, mode=Mode.SUBTRACT)
    with BuildSketch(Plane(origin=(-27.86941617, -28.088666872, 55), x_dir=(0, 0, 1), z_dir=(1, 0, 0))) as filete1_3_piece_16:
        with BuildLine():
            CenterArc((5 + FILETE1_R, -FILETE1_R), FILETE1_R, 90, 90)
            Line((5, -FILETE1_R), (5, 0))
            Line((5, 0), (5 + FILETE1_R, 0))
        make_face()
    revolve(axis=Axis((-27.86941617, -28.088666872, 55), (0, -1, 0)), revolution_arc=90, mode=Mode.SUBTRACT)

    # Esboço8 → Corte-extrusão5 (cut, through all)
    with BuildSketch(Plane(origin=(0, 0, 60), x_dir=(-1, 0, 0), z_dir=(0, 0, -1))):
        with Locations((21.86941617, -18.088666872)):
            Circle(ESBO_O8_R)
        with Locations((103.86941617, -18.088666872)):
            Circle(ESBO_O8_R)
    extrude(amount=-CORTE_EXTRUS_O5_DEPTH, mode=Mode.SUBTRACT)

    # Filete2
    # the kernel refuses this fillet: 5 mm, written as the material it takes off along each edge
    with BuildSketch(Plane(origin=(-78.36941617, -8.088666872, 57), x_dir=(0, 0, -1), z_dir=(1, 0, 0))) as filete2_piece_1:
        with BuildLine():
            CenterArc((FILETE2_R, -FILETE2_R), FILETE2_R, 90, 90)
            Line((0, -FILETE2_R), (0, 0))
            Line((0, 0), (FILETE2_R, 0))
        make_face()
    extrude(amount=31, mode=Mode.SUBTRACT)


solid = part.part
